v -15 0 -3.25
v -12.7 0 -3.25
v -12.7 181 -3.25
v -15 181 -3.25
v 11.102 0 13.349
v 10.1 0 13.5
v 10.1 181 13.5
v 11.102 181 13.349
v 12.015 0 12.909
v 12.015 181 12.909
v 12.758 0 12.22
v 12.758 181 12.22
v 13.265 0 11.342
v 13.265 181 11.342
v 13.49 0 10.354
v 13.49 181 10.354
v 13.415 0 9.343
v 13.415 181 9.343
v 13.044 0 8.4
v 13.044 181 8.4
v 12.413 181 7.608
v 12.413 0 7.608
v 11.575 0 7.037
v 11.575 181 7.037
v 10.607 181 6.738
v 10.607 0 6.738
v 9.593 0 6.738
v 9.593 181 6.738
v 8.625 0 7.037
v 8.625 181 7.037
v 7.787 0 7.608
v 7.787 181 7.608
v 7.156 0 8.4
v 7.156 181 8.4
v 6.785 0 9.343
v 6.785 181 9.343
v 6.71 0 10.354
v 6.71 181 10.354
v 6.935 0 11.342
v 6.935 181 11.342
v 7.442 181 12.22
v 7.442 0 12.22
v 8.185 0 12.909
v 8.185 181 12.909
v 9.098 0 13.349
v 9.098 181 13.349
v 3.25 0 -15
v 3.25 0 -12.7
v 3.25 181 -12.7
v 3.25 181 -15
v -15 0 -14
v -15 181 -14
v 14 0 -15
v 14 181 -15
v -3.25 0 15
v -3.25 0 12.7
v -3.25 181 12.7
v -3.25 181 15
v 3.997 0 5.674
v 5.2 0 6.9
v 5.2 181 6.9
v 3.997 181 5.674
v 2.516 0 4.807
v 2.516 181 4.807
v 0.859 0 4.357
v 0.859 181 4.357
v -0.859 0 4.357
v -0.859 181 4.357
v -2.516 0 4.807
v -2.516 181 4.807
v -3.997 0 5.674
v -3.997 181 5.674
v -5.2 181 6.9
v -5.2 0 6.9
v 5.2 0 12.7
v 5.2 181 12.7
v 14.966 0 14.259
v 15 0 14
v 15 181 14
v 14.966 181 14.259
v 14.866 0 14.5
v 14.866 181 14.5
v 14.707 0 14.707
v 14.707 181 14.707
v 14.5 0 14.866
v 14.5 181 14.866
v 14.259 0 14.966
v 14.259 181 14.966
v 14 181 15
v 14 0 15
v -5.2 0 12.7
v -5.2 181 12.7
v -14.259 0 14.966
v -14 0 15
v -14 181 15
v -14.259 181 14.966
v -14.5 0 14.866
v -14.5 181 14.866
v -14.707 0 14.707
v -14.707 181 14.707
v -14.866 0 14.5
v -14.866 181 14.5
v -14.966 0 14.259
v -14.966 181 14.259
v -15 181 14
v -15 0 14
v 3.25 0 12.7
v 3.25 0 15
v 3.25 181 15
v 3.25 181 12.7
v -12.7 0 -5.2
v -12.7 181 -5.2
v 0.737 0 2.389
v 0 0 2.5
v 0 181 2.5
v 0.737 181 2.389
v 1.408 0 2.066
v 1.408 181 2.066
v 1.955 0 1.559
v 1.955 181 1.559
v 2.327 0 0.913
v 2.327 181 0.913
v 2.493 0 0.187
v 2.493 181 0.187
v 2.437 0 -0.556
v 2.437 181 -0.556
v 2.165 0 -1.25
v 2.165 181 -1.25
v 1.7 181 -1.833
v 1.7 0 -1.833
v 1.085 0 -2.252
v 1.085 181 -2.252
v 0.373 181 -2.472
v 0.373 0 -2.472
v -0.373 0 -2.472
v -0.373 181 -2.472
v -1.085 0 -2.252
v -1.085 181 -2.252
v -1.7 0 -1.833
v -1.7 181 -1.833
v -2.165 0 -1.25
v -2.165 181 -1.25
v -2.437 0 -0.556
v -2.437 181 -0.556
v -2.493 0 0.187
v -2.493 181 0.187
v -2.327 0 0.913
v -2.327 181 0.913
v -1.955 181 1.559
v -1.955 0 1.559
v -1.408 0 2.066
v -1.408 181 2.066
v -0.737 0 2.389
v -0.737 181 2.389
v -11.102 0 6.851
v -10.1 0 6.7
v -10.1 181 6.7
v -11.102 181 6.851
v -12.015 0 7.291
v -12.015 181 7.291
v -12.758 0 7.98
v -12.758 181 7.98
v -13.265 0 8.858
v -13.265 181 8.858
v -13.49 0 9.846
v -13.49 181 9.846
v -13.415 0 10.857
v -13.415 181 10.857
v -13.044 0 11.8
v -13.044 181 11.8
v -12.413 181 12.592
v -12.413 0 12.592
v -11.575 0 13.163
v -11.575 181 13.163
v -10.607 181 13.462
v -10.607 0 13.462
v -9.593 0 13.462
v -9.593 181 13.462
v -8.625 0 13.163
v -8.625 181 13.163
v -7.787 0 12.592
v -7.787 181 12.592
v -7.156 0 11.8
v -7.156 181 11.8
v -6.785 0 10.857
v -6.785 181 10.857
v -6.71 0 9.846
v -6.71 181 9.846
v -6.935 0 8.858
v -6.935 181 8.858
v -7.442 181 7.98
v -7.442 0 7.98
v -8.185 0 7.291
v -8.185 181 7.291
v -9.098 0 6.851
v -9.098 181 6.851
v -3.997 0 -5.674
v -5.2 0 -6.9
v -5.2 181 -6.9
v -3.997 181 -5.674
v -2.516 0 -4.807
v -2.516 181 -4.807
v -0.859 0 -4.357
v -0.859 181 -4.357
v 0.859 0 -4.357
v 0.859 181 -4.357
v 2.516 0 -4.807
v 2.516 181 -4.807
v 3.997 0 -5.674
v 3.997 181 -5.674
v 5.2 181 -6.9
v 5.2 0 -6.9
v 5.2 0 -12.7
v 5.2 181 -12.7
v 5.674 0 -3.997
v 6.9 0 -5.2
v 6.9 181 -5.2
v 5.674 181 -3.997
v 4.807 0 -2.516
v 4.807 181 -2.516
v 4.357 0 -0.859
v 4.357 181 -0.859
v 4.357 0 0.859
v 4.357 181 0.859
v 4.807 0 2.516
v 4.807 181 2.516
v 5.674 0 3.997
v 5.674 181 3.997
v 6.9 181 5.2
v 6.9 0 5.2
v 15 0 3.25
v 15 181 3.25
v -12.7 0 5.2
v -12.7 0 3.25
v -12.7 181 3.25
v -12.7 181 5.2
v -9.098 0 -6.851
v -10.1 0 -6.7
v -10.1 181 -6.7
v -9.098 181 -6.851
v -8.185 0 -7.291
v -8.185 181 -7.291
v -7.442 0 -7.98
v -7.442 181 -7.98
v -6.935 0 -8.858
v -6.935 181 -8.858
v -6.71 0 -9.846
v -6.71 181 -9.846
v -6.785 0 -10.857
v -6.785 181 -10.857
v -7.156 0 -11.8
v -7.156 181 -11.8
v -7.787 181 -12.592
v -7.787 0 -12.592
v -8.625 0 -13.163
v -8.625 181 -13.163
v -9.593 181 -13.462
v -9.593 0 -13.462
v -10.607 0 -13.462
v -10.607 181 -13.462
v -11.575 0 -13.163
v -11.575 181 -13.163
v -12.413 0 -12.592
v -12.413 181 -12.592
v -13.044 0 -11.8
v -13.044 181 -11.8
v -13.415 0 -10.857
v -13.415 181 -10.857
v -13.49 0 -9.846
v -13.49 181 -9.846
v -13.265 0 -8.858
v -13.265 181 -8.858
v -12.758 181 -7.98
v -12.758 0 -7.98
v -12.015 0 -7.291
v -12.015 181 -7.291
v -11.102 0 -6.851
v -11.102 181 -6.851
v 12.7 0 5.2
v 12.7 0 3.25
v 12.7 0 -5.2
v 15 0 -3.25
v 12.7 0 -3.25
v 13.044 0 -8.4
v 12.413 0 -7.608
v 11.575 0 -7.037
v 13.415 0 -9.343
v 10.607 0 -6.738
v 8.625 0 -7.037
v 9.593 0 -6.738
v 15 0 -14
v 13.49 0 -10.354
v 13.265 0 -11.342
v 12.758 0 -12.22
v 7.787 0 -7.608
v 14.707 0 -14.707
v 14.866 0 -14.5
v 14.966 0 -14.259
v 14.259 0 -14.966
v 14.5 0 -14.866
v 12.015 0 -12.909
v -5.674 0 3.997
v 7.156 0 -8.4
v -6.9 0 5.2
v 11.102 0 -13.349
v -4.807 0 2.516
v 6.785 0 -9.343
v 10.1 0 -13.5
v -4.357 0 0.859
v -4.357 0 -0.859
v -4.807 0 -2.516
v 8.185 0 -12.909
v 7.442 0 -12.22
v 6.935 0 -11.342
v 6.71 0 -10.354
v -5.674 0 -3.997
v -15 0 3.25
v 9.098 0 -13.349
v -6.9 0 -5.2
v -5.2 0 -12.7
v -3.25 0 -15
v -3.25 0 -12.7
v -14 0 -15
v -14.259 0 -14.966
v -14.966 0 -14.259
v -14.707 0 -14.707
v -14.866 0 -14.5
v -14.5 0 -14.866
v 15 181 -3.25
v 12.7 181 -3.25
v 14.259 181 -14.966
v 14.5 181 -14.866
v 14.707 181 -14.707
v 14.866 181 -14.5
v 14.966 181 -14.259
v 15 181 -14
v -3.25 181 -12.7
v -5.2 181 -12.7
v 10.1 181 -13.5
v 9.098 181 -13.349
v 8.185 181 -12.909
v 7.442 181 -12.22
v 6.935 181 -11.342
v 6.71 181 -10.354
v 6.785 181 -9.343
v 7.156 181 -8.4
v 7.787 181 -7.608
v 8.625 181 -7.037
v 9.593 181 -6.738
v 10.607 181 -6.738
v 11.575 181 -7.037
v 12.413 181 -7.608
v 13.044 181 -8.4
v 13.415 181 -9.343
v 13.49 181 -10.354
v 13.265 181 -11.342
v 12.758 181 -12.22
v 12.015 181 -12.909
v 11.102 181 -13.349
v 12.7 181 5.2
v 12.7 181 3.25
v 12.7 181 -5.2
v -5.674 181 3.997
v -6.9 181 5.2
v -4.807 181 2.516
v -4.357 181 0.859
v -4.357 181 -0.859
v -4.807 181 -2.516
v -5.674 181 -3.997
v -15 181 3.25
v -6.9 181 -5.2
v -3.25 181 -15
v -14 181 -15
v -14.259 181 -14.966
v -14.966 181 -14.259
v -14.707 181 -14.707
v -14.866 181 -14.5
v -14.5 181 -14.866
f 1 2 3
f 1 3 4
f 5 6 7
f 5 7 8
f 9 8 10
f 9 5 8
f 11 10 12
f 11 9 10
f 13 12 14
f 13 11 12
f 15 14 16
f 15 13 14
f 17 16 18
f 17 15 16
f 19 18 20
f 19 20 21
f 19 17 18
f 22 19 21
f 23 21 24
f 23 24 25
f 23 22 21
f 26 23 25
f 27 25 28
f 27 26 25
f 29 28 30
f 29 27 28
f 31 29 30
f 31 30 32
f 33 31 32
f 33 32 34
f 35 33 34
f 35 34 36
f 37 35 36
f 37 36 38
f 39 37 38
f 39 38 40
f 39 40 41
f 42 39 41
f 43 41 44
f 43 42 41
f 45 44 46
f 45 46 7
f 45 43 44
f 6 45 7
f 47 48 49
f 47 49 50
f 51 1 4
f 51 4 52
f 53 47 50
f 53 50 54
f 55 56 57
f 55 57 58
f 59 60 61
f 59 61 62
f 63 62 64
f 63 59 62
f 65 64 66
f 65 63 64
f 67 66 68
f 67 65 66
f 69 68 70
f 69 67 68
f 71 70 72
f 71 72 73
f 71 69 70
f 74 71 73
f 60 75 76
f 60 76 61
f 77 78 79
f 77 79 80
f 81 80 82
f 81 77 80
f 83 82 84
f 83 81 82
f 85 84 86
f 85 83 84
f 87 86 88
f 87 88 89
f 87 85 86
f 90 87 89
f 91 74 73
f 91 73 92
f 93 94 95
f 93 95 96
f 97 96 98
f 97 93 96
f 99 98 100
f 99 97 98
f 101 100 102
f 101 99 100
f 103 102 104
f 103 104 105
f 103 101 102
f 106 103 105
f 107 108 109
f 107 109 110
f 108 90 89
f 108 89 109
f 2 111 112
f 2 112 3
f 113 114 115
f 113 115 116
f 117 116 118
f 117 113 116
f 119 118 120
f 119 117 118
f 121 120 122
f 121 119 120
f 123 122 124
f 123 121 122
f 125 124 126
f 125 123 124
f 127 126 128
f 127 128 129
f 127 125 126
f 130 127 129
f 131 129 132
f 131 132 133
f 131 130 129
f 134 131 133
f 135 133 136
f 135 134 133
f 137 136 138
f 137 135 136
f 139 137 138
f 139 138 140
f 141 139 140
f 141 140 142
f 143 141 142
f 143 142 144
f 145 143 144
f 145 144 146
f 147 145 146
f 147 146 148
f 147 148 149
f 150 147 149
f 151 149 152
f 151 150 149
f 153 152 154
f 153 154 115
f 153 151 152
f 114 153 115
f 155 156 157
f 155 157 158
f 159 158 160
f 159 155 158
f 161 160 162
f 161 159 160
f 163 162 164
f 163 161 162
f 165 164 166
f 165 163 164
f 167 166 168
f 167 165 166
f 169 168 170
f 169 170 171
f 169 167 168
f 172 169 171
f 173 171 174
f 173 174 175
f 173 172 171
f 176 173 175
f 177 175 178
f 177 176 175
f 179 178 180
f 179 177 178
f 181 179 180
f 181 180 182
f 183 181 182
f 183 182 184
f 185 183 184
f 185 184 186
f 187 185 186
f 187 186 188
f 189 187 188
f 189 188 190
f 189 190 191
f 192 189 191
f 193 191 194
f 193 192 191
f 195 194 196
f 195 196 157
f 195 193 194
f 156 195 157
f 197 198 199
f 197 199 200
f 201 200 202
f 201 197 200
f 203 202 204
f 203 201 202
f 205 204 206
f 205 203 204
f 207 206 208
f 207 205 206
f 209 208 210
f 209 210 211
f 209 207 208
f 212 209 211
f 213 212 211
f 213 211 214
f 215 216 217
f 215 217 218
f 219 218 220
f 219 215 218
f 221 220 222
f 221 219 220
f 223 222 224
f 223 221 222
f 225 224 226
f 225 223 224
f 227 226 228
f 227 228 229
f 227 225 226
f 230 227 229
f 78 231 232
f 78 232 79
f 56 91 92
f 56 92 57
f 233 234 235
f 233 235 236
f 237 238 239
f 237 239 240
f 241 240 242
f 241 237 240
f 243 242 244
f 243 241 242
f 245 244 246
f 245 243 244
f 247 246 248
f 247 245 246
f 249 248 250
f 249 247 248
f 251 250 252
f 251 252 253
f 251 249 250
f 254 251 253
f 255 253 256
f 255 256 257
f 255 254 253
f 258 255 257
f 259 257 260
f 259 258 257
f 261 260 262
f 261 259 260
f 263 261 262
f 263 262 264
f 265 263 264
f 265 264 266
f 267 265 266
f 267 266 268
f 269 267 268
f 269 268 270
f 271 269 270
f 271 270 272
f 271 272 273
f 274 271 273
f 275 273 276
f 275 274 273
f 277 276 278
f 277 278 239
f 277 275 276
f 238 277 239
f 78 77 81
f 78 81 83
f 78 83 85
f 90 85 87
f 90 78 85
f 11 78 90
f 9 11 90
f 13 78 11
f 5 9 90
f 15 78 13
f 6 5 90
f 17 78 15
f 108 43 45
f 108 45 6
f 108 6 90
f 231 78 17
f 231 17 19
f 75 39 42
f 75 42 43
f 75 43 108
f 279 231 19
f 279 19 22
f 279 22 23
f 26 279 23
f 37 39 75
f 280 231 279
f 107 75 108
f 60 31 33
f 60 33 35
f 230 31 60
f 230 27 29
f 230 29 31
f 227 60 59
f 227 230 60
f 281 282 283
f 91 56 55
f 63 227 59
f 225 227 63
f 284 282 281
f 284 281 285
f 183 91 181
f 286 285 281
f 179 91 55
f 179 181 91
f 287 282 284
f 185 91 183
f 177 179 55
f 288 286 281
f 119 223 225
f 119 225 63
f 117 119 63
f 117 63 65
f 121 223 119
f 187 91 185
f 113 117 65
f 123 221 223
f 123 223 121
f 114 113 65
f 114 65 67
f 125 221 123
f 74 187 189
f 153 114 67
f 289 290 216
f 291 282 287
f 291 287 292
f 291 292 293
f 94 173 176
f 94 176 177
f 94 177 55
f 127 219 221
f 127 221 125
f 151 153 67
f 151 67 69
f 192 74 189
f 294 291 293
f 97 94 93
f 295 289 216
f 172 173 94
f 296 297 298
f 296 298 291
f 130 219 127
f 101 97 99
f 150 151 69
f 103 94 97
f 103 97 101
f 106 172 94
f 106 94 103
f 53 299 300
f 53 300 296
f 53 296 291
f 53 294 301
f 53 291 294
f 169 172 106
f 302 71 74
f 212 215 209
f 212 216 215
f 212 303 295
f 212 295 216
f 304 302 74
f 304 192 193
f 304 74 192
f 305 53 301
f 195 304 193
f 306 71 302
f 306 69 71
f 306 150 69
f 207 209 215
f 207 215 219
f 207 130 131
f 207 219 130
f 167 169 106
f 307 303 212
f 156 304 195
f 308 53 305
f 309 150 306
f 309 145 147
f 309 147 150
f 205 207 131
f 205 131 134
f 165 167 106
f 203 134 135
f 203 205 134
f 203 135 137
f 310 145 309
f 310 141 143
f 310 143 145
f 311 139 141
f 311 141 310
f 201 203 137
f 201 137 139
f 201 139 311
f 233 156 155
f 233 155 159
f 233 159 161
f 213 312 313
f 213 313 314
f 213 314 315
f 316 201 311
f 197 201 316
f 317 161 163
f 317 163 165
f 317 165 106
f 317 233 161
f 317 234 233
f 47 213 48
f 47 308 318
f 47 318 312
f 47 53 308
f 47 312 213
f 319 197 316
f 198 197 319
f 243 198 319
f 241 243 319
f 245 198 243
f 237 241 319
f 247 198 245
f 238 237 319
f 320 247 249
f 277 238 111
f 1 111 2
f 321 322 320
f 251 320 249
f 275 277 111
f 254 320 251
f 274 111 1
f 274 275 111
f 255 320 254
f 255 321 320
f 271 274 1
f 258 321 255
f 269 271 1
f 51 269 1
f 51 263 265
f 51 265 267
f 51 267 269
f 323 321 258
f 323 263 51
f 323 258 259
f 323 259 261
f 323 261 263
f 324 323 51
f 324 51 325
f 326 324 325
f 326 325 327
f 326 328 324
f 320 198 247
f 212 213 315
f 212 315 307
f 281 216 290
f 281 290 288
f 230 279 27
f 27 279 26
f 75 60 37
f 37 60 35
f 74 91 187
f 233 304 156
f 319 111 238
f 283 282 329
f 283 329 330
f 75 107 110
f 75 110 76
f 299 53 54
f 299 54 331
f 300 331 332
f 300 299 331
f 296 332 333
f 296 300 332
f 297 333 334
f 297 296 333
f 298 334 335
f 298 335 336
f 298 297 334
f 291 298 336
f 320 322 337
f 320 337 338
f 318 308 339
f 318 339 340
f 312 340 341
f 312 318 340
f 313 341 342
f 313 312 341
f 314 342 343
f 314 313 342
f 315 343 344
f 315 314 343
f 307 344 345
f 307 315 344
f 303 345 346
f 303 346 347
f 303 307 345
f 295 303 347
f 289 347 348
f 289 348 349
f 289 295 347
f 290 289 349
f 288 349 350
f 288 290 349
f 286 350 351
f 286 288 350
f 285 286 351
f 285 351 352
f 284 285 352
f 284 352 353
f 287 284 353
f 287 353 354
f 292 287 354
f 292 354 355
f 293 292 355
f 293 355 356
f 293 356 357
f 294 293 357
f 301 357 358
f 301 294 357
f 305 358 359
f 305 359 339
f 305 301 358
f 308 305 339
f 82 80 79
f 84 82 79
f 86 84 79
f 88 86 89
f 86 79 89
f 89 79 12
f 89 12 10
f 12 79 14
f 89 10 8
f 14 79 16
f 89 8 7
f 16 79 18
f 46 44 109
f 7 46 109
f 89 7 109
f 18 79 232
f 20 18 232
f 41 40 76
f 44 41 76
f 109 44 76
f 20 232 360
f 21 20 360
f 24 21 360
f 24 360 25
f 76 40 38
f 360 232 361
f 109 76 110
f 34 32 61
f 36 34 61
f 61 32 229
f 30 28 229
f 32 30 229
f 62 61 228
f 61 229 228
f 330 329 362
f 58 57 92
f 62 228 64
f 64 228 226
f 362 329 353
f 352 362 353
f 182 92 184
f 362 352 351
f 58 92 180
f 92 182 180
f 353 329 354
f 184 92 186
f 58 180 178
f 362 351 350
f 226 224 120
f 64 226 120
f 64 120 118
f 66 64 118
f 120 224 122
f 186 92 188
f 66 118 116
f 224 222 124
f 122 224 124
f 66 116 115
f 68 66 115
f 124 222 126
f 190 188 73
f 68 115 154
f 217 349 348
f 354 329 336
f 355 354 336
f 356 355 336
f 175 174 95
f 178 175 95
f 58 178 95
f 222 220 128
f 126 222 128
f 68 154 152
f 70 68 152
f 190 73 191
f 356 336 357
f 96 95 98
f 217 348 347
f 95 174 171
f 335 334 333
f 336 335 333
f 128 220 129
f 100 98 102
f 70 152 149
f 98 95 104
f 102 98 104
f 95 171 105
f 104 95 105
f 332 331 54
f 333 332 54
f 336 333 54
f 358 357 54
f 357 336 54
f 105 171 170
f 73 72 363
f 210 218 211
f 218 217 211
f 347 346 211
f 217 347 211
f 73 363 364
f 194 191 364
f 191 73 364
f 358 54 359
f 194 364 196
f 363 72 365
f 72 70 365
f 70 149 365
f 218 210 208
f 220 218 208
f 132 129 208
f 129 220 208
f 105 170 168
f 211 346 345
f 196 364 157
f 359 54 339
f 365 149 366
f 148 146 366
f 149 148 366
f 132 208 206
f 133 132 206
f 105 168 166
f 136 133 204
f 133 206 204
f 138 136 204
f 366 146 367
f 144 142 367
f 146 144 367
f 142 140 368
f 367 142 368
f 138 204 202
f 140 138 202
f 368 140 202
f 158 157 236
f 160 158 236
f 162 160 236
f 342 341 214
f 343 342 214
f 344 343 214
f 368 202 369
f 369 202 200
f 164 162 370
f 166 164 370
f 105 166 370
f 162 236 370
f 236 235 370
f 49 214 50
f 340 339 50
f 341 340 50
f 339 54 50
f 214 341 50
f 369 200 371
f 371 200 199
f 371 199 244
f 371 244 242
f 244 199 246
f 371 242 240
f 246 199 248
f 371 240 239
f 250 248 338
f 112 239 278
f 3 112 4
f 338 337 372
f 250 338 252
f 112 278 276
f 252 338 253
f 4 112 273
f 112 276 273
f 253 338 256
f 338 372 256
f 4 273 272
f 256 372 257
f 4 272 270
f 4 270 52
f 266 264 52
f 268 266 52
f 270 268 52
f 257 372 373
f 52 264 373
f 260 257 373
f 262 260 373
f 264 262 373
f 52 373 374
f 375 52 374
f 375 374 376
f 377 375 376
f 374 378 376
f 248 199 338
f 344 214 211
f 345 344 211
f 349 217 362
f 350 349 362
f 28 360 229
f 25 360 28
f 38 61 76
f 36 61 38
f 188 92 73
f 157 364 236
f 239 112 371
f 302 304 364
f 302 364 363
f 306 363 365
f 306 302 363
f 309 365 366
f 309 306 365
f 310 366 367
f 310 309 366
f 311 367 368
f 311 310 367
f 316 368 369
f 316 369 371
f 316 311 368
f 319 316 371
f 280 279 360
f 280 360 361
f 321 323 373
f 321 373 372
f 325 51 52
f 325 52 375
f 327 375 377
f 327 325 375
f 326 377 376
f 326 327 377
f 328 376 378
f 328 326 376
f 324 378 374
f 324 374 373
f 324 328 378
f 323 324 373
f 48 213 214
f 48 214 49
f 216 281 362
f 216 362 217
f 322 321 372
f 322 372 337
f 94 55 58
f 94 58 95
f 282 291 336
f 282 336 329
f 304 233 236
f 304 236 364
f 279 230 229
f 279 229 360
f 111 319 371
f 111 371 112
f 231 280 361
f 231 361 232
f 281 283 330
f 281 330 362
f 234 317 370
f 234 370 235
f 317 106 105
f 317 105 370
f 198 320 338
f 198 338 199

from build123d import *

# Parameters (mm, degrees)
SKETCH_1_R      = 2.5
SKETCH_1_R_2    = 3.4
EXTRUDE_1_DEPTH = 181


with BuildPart() as part:
    # 草图1 → 凸台-拉伸1 (new body)
    with BuildSketch(Plane(origin=(0, 0, 0), x_dir=(1, 0, 0), z_dir=(0, 1, 0))):
        with BuildLine():
            Line((-14, 15), (-3.25, 15))
            Line((-3.25, 15), (-3.25, 12.7))
            Line((-3.25, 12.7), (-5.2, 12.7))
            Line((-5.2, 12.7), (-5.2, 6.9))
            ThreePointArc((-5.2, 6.9), (0, 4.3), (5.2, 6.9))
            Line((5.2, 6.9), (5.2, 12.7))
            Line((5.2, 12.7), (3.25, 12.7))
            Line((3.25, 12.7), (3.25, 15))
            Line((3.25, 15), (14, 15))
            ThreePointArc((14, 15), (14.707106781, 14.707106781), (15, 14))
            Line((15, 14), (15, 3.25))
            Line((15, 3.25), (12.7, 3.25))
            Line((12.7, 3.25), (12.7, 5.2))
            Line((12.7, 5.2), (6.9, 5.2))
            ThreePointArc((6.9, 5.2), (4.3, 0), (6.9, -5.2))
            Line((6.9, -5.2), (12.7, -5.2))
            Line((12.7, -5.2), (12.7, -3.25))
            Line((12.7, -3.25), (15, -3.25))
            Line((15, -3.25), (15, -14))
            ThreePointArc((15, -14), (14.707106781, -14.707106781), (14, -15))
            Line((14, -15), (3.25, -15))
            Line((3.25, -15), (3.25, -12.7))
            Line((3.25, -12.7), (5.2, -12.7))
            Line((5.2, -12.7), (5.2, -6.9))
            ThreePointArc((5.2, -6.9), (0, -4.3), (-5.2, -6.9))
            Line((-5.2, -6.9), (-5.2, -12.7))
            Line((-5.2, -12.7), (-3.25, -12.7))
            Line((-3.25, -12.7), (-3.25, -15))
            Line((-3.25, -15), (-14, -15))
            ThreePointArc((-14, -15), (-14.707106781, -14.707106781), (-15, -14))
            Line((-15, -14), (-15, -3.25))
            Line((-15, -3.25), (-12.7, -3.25))
            Line((-12.7, -3.25), (-12.7, -5.2))
            Line((-12.7, -5.2), (-6.9, -5.2))
            ThreePointArc((-6.9, -5.2), (-4.3, 0), (-6.9, 5.2))
            Line((-6.9, 5.2), (-12.7, 5.2))
            Line((-12.7, 5.2), (-12.7, 3.25))
            Line((-12.7, 3.25), (-15, 3.25))
            Line((-15, 3.25), (-15, 14))
            ThreePointArc((-15, 14), (-14.707106781, 14.707106781), (-14, 15))
        make_face()
        with Locations(Location((0, 0, 0), (0, 0, 270))):
            Circle(SKETCH_1_R, mode=Mode.SUBTRACT)
        with Locations(Location((-10.1, 10.1, 0), (0, 0, 270))):
            Circle(SKETCH_1_R_2, mode=Mode.SUBTRACT)
        with Locations(Location((10.1, 10.1, 0), (0, 0, 90))):
            Circle(SKETCH_1_R_2, mode=Mode.SUBTRACT)
        with Locations(Location((10.1, -10.1, 0), (0, 0, 270))):
            Circle(SKETCH_1_R_2, mode=Mode.SUBTRACT)
        with Locations(Location((-10.1, -10.1, 0), (0, 0, 90))):
            Circle(SKETCH_1_R_2, mode=Mode.SUBTRACT)
    extrude(amount=EXTRUDE_1_DEPTH)


solid = part.part
